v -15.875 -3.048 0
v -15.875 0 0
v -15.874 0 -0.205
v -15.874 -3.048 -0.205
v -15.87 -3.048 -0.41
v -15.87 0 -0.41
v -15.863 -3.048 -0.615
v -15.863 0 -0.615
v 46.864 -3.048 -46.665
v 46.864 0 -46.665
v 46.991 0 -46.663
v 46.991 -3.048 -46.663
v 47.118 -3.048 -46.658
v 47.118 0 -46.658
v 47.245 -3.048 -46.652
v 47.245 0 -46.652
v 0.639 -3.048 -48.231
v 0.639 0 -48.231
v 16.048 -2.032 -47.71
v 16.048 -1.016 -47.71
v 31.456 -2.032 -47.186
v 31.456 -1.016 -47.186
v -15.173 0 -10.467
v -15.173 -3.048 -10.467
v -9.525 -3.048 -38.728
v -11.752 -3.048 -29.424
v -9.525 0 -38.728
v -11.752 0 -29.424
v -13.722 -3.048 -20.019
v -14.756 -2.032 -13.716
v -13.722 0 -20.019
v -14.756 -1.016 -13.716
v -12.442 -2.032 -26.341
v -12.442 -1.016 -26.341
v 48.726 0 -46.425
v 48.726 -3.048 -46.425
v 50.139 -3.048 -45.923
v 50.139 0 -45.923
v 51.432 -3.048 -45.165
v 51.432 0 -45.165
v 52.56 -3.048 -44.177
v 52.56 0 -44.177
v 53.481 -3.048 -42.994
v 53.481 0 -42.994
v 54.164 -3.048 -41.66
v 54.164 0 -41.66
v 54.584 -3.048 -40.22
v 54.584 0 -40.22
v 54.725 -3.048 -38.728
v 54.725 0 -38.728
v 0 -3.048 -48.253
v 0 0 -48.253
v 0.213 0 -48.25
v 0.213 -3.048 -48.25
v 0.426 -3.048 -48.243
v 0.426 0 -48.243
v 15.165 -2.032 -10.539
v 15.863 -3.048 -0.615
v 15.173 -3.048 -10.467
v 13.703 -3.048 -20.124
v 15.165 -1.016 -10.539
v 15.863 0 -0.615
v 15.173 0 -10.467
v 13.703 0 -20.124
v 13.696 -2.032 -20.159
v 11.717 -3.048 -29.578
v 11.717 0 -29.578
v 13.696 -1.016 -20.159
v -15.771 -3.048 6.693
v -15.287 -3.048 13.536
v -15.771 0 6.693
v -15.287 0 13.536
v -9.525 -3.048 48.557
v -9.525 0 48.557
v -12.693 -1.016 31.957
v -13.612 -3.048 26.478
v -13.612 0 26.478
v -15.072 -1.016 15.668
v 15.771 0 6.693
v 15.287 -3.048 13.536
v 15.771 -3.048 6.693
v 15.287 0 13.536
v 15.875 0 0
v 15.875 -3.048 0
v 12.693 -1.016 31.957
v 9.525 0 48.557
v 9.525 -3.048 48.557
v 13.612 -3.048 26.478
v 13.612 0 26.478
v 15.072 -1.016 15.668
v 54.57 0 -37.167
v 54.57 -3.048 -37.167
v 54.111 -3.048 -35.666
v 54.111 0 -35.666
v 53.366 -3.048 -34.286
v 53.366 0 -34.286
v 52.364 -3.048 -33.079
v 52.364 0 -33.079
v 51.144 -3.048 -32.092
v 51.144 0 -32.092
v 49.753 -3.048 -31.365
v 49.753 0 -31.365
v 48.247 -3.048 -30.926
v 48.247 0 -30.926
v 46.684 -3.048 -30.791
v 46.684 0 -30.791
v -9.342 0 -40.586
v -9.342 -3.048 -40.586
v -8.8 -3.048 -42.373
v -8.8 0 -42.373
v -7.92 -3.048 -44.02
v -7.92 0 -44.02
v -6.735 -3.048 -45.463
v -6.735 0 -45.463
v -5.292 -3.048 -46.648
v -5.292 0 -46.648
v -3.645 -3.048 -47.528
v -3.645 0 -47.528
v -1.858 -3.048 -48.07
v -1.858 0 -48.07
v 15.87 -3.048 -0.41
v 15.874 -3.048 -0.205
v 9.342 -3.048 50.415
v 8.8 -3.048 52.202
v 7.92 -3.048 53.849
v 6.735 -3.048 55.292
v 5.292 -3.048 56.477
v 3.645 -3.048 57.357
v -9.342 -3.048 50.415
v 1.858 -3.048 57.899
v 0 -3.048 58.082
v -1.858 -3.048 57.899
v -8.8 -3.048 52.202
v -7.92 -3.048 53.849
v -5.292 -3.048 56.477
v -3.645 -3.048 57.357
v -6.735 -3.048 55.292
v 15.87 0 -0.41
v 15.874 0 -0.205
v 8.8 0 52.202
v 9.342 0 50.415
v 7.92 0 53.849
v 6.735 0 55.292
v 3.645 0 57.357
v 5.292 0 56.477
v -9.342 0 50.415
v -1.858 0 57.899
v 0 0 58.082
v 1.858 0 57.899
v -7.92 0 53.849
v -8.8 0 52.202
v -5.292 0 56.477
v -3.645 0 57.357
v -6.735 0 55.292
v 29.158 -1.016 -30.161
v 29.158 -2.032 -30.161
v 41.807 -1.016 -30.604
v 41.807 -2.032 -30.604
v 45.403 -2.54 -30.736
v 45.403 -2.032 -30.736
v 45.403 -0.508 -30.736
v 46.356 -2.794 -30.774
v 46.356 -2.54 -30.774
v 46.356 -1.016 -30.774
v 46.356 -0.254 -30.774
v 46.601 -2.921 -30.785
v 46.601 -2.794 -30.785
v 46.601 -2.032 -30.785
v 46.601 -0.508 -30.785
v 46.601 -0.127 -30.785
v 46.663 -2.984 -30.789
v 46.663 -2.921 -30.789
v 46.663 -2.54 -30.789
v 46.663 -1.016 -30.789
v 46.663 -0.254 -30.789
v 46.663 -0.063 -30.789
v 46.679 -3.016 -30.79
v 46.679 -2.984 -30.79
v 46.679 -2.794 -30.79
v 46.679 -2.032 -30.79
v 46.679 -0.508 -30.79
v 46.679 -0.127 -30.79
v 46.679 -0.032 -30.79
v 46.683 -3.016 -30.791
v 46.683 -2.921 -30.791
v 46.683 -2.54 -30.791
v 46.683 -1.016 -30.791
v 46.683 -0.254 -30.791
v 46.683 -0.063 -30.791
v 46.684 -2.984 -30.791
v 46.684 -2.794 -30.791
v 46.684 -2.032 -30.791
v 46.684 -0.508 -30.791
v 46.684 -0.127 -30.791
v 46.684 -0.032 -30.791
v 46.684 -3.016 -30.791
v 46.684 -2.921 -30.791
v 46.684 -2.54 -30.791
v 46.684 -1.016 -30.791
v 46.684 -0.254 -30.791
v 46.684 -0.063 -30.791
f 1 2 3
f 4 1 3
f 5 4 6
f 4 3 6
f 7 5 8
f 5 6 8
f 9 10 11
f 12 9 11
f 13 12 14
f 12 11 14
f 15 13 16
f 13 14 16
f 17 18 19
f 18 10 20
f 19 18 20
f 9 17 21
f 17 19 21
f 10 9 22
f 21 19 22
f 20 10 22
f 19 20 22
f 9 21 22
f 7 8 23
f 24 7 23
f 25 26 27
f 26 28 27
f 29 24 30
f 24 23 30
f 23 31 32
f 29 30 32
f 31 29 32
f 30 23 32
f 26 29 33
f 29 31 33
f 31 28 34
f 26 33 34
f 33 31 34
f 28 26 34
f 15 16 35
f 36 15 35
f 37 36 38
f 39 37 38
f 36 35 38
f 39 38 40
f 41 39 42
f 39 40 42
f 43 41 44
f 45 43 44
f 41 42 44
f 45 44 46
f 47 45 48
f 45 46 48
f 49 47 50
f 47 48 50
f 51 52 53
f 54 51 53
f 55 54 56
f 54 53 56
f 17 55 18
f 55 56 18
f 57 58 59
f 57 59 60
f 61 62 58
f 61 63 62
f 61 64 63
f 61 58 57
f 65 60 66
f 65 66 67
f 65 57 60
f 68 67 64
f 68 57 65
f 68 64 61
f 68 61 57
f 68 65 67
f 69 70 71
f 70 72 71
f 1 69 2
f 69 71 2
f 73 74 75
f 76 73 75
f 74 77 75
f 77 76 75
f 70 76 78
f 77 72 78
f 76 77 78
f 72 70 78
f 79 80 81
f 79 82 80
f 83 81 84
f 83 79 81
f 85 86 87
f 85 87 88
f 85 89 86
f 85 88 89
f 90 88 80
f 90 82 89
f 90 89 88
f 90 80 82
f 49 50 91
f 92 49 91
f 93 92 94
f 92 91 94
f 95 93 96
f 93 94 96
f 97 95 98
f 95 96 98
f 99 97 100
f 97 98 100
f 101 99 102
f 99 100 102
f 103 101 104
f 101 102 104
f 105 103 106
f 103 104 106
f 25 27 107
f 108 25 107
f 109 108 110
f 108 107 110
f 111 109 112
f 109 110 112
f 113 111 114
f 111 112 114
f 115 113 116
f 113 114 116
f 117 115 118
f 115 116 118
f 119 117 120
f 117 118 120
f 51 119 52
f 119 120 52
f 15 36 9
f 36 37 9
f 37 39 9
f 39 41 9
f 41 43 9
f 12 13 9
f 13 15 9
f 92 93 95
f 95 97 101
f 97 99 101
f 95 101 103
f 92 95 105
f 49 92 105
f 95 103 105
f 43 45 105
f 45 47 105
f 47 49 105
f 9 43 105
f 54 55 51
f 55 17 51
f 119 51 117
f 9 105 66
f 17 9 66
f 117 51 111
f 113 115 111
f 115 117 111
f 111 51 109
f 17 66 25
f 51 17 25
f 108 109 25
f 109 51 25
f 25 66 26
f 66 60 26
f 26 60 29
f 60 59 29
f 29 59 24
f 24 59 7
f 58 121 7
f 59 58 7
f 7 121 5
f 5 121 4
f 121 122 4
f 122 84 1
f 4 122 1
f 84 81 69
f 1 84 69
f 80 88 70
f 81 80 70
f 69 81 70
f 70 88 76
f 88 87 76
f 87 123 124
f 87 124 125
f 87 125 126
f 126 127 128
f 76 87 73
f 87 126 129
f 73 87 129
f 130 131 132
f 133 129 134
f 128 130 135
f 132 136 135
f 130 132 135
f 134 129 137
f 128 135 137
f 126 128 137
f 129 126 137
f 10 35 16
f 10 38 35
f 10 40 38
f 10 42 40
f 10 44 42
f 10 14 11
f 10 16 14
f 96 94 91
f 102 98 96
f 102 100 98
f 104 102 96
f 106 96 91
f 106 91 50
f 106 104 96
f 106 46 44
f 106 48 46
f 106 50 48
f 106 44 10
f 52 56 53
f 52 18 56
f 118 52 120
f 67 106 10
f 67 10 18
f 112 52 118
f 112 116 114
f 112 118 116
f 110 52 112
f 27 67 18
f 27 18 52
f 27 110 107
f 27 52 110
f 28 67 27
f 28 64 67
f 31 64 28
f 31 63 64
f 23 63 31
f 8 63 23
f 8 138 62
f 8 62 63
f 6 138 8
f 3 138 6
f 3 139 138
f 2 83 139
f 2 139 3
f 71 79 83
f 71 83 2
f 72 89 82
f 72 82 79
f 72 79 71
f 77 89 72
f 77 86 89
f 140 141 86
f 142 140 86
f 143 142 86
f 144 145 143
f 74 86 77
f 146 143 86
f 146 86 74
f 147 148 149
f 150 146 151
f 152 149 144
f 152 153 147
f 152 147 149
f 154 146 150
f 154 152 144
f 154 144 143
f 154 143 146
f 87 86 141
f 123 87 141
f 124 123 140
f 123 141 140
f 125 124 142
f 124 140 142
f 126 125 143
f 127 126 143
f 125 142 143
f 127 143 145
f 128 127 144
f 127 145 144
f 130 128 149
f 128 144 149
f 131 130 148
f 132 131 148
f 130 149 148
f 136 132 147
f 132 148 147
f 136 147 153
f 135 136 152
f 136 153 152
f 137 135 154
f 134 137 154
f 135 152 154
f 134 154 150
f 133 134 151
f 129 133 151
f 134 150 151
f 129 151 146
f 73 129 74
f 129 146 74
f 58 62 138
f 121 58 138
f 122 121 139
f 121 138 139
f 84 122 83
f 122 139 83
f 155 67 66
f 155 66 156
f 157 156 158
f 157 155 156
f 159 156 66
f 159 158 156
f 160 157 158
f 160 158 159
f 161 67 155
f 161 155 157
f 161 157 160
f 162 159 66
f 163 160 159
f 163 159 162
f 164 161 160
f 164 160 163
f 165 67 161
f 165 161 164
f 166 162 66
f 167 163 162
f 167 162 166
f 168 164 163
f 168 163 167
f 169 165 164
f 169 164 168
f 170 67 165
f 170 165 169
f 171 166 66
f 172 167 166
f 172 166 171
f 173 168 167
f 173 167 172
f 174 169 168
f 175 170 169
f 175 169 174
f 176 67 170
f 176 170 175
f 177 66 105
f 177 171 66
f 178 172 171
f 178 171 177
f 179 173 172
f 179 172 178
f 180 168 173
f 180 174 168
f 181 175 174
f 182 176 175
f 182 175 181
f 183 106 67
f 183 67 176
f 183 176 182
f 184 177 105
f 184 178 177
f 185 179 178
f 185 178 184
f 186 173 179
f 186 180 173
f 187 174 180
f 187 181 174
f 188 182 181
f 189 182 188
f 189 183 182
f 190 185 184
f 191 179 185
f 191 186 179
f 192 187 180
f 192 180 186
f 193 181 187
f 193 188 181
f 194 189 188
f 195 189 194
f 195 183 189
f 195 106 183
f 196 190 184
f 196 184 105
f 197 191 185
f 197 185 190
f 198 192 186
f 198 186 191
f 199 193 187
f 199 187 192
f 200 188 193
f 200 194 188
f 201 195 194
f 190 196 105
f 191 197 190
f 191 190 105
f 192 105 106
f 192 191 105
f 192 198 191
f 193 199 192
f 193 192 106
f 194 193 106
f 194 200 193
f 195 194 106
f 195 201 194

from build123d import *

# Parameters (mm, degrees)
F1_DEPTH = 3.048


with BuildPart() as f1:
    # F0 (on Front) → F1 (new body)
    with BuildSketch(Plane.XZ):
        with BuildLine():
            add(Edge.make_bspline(
                [(0, -29.2028061362), (0.1994290432, -29.2090684708), (0.3988582249, -29.2153378493), (0.5982729839, -29.2216137104)],
                knots=[0, 0, 0, 0, 0.0080246695, 0.0080246695, 0.0080246695, 0.0080246695], degree=3))
            Line((0, -29.2028061362), (0, -38.7278061362))
            Line((0, -38.7278061362), (9.525, -38.7278061362))
            ThreePointArc((9.525, -38.7278061362), (6.9434924632, -32.2075655415), (0.5982729839, -29.2216137104))
        make_face()
        with BuildLine():
            ThreePointArc((-9.525, -38.7278061362), (-6.7351920908, -31.9926140454), (0, -29.2028061362))
            Line((0, -29.2028061362), (0, -15.875))
            ThreePointArc((0, -15.875), (-11.0057082375, -11.4407172498), (-15.8630798211, -0.6150801499))
            add(Edge.make_bspline(
                [(-15.8630798211, -0.6150801499), (-15.5610688303, -14.0326352056), (-12.5430344151, -26.3802206709), (-9.525, -38.7278061362)],
                knots=[0.5347471817, 0.5347471817, 0.5347471817, 0.5347471817, 1, 1, 1, 1], degree=3))
        make_face()
        with BuildLine():
            Line((0, -38.7278061362), (0, -29.2028061362))
            ThreePointArc((0, -29.2028061362), (-6.7351920908, -31.9926140454), (-9.525, -38.7278061362))
            ThreePointArc((-9.525, -38.7278061362), (-6.7351920908, -45.4629982271), (0, -48.2528061362))
            add(Edge.make_bspline(
                [(0, -48.2528061362), (0.2131130588, -48.2456482665), (0.4262259719, -48.2384878681), (0.6393387432, -48.2313250094)],
                knots=[0, 0, 0, 0, 0.6396952306, 0.6396952306, 0.6396952306, 0.6396952306], degree=3))
            ThreePointArc((0.6393387432, -48.2313250094), (6.957561589, -45.2330318614), (9.525, -38.7278061362))
            Line((9.525, -38.7278061362), (0, -38.7278061362))
        make_face()
        with BuildLine():
            Line((0, -15.875), (0, -29.2028061362))
            ThreePointArc((0, -29.2028061362), (0.2992842663, -29.2075091909), (0.5982729839, -29.2216137104))
            add(Edge.make_bspline(
                [(0.5982729839, -29.2216137104), (4.3416181778, -29.339422014), (8.0798811955, -29.4595146085), (11.716745228, -29.5781777813)],
                knots=[0.0080246695, 0.0080246695, 0.0080246695, 0.0080246695, 0.1586610028, 0.1586610028, 0.1586610028, 0.1586610028], degree=3))
            add(Edge.make_bspline(
                [(15.8630798211, -0.6150801499), (15.6355353264, -10.7242843795), (13.866216965, -20.2261112434), (11.7167452282, -29.578177782)],
                knots=[0.5347471817, 0.5347471817, 0.5347471817, 0.5347471817, 0.8852831578, 0.8852831578, 0.8852831578, 0.8852831578], degree=3))
            ThreePointArc((15.8630798211, -0.6150801499), (11.0057082375, -11.4407172498), (0, -15.875))
        make_face()
        with BuildLine():
            ThreePointArc((0.5982729839, -29.2216137104), (0.2992842663, -29.2075091909), (0, -29.2028061362))
            add(Edge.make_bspline(
                [(0, -29.2028061362), (0.1994290432, -29.2090684708), (0.3988582249, -29.2153378493), (0.5982729839, -29.2216137104)],
                knots=[0, 0, 0, 0, 0.0080246695, 0.0080246695, 0.0080246695, 0.0080246695], degree=3))
        make_face()
        with BuildLine():
            ThreePointArc((-15.8630798211, -0.6150801499), (-11.0057082375, -11.4407172498), (0, -15.875))
            Line((0, -15.875), (0, 0))
            Line((0, 0), (0, 15.875))
            ThreePointArc((0, 15.875), (-11.2253201513, 11.2253201513), (-15.875, 0))
            add(Edge.make_bspline(
                [(-15.875, 0), (-15.8716656679, -0.2052784728), (-15.8676890566, -0.4103039216), (-15.8630798211, -0.6150801499)],
                knots=[0.5276465798, 0.5276465798, 0.5276465798, 0.5276465798, 0.5347471817, 0.5347471817, 0.5347471817, 0.5347471817], degree=3))
        make_face()
        with BuildLine():
            Line((0, 0), (0, -15.875))
            ThreePointArc((0, -15.875), (11.0057082375, -11.4407172498), (15.8630798211, -0.6150801499))
            add(Edge.make_bspline(
                [(15.875, 0), (15.8716656679, -0.2052784728), (15.8676890566, -0.4103039216), (15.8630798211, -0.6150801499)],
                knots=[0.5276465798, 0.5276465798, 0.5276465798, 0.5276465798, 0.5347471817, 0.5347471817, 0.5347471817, 0.5347471817], degree=3))
            ThreePointArc((15.875, 0), (11.2253201513, 11.2253201513), (0, 15.875))
            Line((0, 15.875), (0, 0))
        make_face()
        with BuildLine():
            add(Edge.make_bspline(
                [(0.5982729839, -29.2216137104), (4.3416181778, -29.339422014), (8.0798811955, -29.4595146085), (11.716745228, -29.5781777813)],
                knots=[0.0080246695, 0.0080246695, 0.0080246695, 0.0080246695, 0.1586610028, 0.1586610028, 0.1586610028, 0.1586610028], degree=3))
            ThreePointArc((0.5982729839, -29.2216137104), (6.9434924632, -32.2075655415), (9.525, -38.7278061362))
            add(Edge.make_bspline(
                [(11.7167452282, -29.578177782), (11.0133064179, -32.63874678), (10.2691532089, -35.6832764581), (9.525, -38.7278061362)],
                knots=[0.8852831578, 0.8852831578, 0.8852831578, 0.8852831578, 1, 1, 1, 1], degree=3))
        make_face()
        with BuildLine():
            add(Edge.make_bspline(
                [(11.7167452282, -29.578177782), (11.0133064179, -32.63874678), (10.2691532089, -35.6832764581), (9.525, -38.7278061362)],
                knots=[0.8852831578, 0.8852831578, 0.8852831578, 0.8852831578, 1, 1, 1, 1], degree=3))
            Line((9.525, -38.7278061362), (38.8504122414, -38.7278061362))
            ThreePointArc((38.8504122414, -38.7278061362), (41.0703889722, -33.2220061112), (46.4885436218, -30.7959535986))
            add(Edge.make_bspline(
                [(46.6014932618, -30.7924955428), (46.5682462049, -30.7929887265), (46.5283758233, -30.7939133608), (46.4885436218, -30.7959535986)],
                knots=[0.9751953485, 0.9751953485, 0.9751953485, 0.9751953485, 1, 1, 1, 1], degree=3))
            ThreePointArc((46.6014932618, -30.7924955428), (46.6427611197, -30.7916334188), (46.684032903, -30.7909859082))
            add(Edge.make_bspline(
                [(11.716745228, -29.5781777813), (30.5622726651, -30.1930674385), (46.6851234184, -30.7695755158), (46.684032903, -30.7909859082)],
                knots=[0.1586610028, 0.1586610028, 0.1586610028, 0.1586610028, 0.9392294066, 0.9392294066, 0.9392294066, 0.9392294066], degree=3))
        make_face()
        with BuildLine():
            Line((38.8504122414, -38.7278061362), (9.525, -38.7278061362))
            ThreePointArc((9.525, -38.7278061362), (6.957561589, -45.2330318614), (0.6393387432, -48.2313250094))
            add(Edge.make_bspline(
                [(0.6393387432, -48.2313250094), (16.0478252892, -47.7134357647), (31.455570606, -47.182685244), (46.8640654981, -46.6649408164)],
                knots=[0.6396952306, 0.6396952306, 0.6396952306, 0.6396952306, 46.8909606742, 46.8909606742, 46.8909606742, 46.8909606742], degree=3))
            ThreePointArc((46.8640654981, -46.6649408164), (41.2022412981, -44.3673261834), (38.8504122414, -38.7278061362))
        make_face()
        with BuildLine():
            ThreePointArc((-15.875, 0), (-15.8720196755, -0.3075978225), (-15.8630798211, -0.6150801499))
            add(Edge.make_bspline(
                [(-15.875, 0), (-15.8716656679, -0.2052784728), (-15.8676890566, -0.4103039216), (-15.8630798211, -0.6150801499)],
                knots=[0.5276465798, 0.5276465798, 0.5276465798, 0.5276465798, 0.5347471817, 0.5347471817, 0.5347471817, 0.5347471817], degree=3))
        make_face()
        with BuildLine():
            add(Edge.make_bspline(
                [(15.875, 0), (15.8716656679, -0.2052784728), (15.8676890566, -0.4103039216), (15.8630798211, -0.6150801499)],
                knots=[0.5276465798, 0.5276465798, 0.5276465798, 0.5276465798, 0.5347471817, 0.5347471817, 0.5347471817, 0.5347471817], degree=3))
            ThreePointArc((15.8630798211, -0.6150801499), (15.8720196755, -0.3075978225), (15.875, 0))
        make_face()
        with BuildLine():
            add(Edge.make_bspline(
                [(0, -48.2528061362), (0.2131130588, -48.2456482665), (0.4262259719, -48.2384878681), (0.6393387432, -48.2313250094)],
                knots=[0, 0, 0, 0, 0.6396952306, 0.6396952306, 0.6396952306, 0.6396952306], degree=3))
            ThreePointArc((0, -48.2528061362), (0.3198497567, -48.2474343398), (0.6393387432, -48.2313250094))
        make_face()
        with BuildLine():
            ThreePointArc((46.4885436218, -30.7959535986), (41.0703889722, -33.2220061112), (38.8504122414, -38.7278061362))
            ThreePointArc((38.8504122414, -38.7278061362), (41.2022412981, -44.3673261834), (46.8640654981, -46.6649408164))
            add(Edge.make_bspline(
                [(46.8640654981, -46.6649408164), (46.9909147503, -46.6606785252), (47.1177640532, -46.6564171153), (47.2446134078, -46.6521566014)],
                knots=[46.8909606742, 46.8909606742, 46.8909606742, 46.8909606742, 47.2717206688, 47.2717206688, 47.2717206688, 47.2717206688], degree=3))
            ThreePointArc((47.2446134078, -46.6521566014), (52.5597824651, -44.1766060381), (54.7254122414, -38.7278061362))
            ThreePointArc((54.7254122414, -38.7278061362), (52.3637244693, -33.078538551), (46.684032903, -30.7909859082))
            add(Edge.make_bspline(
                [(46.684032903, -30.7909859082), (46.6839826557, -30.7919724263), (46.6497004182, -30.7917804424), (46.6014932618, -30.7924955428)],
                knots=[0.9392294066, 0.9392294066, 0.9392294066, 0.9392294066, 0.9751953485, 0.9751953485, 0.9751953485, 0.9751953485], degree=3))
            ThreePointArc((46.6014932618, -30.7924955428), (46.5450122879, -30.7940235666), (46.4885436218, -30.7959535986))
        make_face()
        with BuildLine():
            ThreePointArc((-15.875, 0), (-11.2253201513, 11.2253201513), (0, 15.875))
            Line((0, 15.875), (0, 39.0321981638))
            ThreePointArc((0, 39.0321981638), (-6.7351920908, 41.822006073), (-9.525, 48.5571981638))
            add(Edge.make_bspline(
                [(-9.525, 48.5571981638), (-12.8238873086, 31.9057330322), (-16.1227746172, 15.2542679006), (-15.875, 0)],
                knots=[0, 0, 0, 0, 0.5276465798, 0.5276465798, 0.5276465798, 0.5276465798], degree=3))
        make_face()
        with BuildLine():
            Line((0, 39.0321981638), (0, 15.875))
            ThreePointArc((0, 15.875), (11.2253201513, 11.2253201513), (15.875, 0))
            add(Edge.make_bspline(
                [(9.525, 48.5571981638), (12.8238873086, 31.9057330322), (16.1227746172, 15.2542679006), (15.875, 0)],
                knots=[0, 0, 0, 0, 0.5276465798, 0.5276465798, 0.5276465798, 0.5276465798], degree=3))
            ThreePointArc((9.525, 48.5571981638), (6.7351920908, 41.822006073), (0, 39.0321981638))
        make_face()
        with BuildLine():
            add(Edge.make_bspline(
                [(46.684032903, -30.7909859082), (46.6839826557, -30.7919724263), (46.6497004182, -30.7917804424), (46.6014932618, -30.7924955428)],
                knots=[0.9392294066, 0.9392294066, 0.9392294066, 0.9392294066, 0.9751953485, 0.9751953485, 0.9751953485, 0.9751953485], degree=3))
            ThreePointArc((46.684032903, -30.7909859082), (46.6427611197, -30.7916334188), (46.6014932618, -30.7924955428))
        make_face()
        with BuildLine():
            add(Edge.make_bspline(
                [(46.6014932618, -30.7924955428), (46.5682462049, -30.7929887265), (46.5283758233, -30.7939133608), (46.4885436218, -30.7959535986)],
                knots=[0.9751953485, 0.9751953485, 0.9751953485, 0.9751953485, 1, 1, 1, 1], degree=3))
            ThreePointArc((46.4885436218, -30.7959535986), (46.5450122879, -30.7940235666), (46.6014932618, -30.7924955428))
        make_face()
        with BuildLine():
            add(Edge.make_bspline(
                [(46.8640654981, -46.6649408164), (46.9909147503, -46.6606785252), (47.1177640532, -46.6564171153), (47.2446134078, -46.6521566014)],
                knots=[46.8909606742, 46.8909606742, 46.8909606742, 46.8909606742, 47.2717206688, 47.2717206688, 47.2717206688, 47.2717206688], degree=3))
            ThreePointArc((46.8640654981, -46.6649408164), (47.0544161215, -46.6608309019), (47.2446134078, -46.6521566014))
        make_face()
        with BuildLine():
            ThreePointArc((-9.525, 48.5571981638), (-6.7351920908, 41.822006073), (0, 39.0321981638))
            ThreePointArc((0, 39.0321981638), (6.7351920908, 41.822006073), (9.525, 48.5571981638))
            ThreePointArc((9.525, 48.5571981638), (0, 58.0821981638), (-9.525, 48.5571981638))
        make_face()
    extrude(amount=F1_DEPTH)


solid = f1.part
